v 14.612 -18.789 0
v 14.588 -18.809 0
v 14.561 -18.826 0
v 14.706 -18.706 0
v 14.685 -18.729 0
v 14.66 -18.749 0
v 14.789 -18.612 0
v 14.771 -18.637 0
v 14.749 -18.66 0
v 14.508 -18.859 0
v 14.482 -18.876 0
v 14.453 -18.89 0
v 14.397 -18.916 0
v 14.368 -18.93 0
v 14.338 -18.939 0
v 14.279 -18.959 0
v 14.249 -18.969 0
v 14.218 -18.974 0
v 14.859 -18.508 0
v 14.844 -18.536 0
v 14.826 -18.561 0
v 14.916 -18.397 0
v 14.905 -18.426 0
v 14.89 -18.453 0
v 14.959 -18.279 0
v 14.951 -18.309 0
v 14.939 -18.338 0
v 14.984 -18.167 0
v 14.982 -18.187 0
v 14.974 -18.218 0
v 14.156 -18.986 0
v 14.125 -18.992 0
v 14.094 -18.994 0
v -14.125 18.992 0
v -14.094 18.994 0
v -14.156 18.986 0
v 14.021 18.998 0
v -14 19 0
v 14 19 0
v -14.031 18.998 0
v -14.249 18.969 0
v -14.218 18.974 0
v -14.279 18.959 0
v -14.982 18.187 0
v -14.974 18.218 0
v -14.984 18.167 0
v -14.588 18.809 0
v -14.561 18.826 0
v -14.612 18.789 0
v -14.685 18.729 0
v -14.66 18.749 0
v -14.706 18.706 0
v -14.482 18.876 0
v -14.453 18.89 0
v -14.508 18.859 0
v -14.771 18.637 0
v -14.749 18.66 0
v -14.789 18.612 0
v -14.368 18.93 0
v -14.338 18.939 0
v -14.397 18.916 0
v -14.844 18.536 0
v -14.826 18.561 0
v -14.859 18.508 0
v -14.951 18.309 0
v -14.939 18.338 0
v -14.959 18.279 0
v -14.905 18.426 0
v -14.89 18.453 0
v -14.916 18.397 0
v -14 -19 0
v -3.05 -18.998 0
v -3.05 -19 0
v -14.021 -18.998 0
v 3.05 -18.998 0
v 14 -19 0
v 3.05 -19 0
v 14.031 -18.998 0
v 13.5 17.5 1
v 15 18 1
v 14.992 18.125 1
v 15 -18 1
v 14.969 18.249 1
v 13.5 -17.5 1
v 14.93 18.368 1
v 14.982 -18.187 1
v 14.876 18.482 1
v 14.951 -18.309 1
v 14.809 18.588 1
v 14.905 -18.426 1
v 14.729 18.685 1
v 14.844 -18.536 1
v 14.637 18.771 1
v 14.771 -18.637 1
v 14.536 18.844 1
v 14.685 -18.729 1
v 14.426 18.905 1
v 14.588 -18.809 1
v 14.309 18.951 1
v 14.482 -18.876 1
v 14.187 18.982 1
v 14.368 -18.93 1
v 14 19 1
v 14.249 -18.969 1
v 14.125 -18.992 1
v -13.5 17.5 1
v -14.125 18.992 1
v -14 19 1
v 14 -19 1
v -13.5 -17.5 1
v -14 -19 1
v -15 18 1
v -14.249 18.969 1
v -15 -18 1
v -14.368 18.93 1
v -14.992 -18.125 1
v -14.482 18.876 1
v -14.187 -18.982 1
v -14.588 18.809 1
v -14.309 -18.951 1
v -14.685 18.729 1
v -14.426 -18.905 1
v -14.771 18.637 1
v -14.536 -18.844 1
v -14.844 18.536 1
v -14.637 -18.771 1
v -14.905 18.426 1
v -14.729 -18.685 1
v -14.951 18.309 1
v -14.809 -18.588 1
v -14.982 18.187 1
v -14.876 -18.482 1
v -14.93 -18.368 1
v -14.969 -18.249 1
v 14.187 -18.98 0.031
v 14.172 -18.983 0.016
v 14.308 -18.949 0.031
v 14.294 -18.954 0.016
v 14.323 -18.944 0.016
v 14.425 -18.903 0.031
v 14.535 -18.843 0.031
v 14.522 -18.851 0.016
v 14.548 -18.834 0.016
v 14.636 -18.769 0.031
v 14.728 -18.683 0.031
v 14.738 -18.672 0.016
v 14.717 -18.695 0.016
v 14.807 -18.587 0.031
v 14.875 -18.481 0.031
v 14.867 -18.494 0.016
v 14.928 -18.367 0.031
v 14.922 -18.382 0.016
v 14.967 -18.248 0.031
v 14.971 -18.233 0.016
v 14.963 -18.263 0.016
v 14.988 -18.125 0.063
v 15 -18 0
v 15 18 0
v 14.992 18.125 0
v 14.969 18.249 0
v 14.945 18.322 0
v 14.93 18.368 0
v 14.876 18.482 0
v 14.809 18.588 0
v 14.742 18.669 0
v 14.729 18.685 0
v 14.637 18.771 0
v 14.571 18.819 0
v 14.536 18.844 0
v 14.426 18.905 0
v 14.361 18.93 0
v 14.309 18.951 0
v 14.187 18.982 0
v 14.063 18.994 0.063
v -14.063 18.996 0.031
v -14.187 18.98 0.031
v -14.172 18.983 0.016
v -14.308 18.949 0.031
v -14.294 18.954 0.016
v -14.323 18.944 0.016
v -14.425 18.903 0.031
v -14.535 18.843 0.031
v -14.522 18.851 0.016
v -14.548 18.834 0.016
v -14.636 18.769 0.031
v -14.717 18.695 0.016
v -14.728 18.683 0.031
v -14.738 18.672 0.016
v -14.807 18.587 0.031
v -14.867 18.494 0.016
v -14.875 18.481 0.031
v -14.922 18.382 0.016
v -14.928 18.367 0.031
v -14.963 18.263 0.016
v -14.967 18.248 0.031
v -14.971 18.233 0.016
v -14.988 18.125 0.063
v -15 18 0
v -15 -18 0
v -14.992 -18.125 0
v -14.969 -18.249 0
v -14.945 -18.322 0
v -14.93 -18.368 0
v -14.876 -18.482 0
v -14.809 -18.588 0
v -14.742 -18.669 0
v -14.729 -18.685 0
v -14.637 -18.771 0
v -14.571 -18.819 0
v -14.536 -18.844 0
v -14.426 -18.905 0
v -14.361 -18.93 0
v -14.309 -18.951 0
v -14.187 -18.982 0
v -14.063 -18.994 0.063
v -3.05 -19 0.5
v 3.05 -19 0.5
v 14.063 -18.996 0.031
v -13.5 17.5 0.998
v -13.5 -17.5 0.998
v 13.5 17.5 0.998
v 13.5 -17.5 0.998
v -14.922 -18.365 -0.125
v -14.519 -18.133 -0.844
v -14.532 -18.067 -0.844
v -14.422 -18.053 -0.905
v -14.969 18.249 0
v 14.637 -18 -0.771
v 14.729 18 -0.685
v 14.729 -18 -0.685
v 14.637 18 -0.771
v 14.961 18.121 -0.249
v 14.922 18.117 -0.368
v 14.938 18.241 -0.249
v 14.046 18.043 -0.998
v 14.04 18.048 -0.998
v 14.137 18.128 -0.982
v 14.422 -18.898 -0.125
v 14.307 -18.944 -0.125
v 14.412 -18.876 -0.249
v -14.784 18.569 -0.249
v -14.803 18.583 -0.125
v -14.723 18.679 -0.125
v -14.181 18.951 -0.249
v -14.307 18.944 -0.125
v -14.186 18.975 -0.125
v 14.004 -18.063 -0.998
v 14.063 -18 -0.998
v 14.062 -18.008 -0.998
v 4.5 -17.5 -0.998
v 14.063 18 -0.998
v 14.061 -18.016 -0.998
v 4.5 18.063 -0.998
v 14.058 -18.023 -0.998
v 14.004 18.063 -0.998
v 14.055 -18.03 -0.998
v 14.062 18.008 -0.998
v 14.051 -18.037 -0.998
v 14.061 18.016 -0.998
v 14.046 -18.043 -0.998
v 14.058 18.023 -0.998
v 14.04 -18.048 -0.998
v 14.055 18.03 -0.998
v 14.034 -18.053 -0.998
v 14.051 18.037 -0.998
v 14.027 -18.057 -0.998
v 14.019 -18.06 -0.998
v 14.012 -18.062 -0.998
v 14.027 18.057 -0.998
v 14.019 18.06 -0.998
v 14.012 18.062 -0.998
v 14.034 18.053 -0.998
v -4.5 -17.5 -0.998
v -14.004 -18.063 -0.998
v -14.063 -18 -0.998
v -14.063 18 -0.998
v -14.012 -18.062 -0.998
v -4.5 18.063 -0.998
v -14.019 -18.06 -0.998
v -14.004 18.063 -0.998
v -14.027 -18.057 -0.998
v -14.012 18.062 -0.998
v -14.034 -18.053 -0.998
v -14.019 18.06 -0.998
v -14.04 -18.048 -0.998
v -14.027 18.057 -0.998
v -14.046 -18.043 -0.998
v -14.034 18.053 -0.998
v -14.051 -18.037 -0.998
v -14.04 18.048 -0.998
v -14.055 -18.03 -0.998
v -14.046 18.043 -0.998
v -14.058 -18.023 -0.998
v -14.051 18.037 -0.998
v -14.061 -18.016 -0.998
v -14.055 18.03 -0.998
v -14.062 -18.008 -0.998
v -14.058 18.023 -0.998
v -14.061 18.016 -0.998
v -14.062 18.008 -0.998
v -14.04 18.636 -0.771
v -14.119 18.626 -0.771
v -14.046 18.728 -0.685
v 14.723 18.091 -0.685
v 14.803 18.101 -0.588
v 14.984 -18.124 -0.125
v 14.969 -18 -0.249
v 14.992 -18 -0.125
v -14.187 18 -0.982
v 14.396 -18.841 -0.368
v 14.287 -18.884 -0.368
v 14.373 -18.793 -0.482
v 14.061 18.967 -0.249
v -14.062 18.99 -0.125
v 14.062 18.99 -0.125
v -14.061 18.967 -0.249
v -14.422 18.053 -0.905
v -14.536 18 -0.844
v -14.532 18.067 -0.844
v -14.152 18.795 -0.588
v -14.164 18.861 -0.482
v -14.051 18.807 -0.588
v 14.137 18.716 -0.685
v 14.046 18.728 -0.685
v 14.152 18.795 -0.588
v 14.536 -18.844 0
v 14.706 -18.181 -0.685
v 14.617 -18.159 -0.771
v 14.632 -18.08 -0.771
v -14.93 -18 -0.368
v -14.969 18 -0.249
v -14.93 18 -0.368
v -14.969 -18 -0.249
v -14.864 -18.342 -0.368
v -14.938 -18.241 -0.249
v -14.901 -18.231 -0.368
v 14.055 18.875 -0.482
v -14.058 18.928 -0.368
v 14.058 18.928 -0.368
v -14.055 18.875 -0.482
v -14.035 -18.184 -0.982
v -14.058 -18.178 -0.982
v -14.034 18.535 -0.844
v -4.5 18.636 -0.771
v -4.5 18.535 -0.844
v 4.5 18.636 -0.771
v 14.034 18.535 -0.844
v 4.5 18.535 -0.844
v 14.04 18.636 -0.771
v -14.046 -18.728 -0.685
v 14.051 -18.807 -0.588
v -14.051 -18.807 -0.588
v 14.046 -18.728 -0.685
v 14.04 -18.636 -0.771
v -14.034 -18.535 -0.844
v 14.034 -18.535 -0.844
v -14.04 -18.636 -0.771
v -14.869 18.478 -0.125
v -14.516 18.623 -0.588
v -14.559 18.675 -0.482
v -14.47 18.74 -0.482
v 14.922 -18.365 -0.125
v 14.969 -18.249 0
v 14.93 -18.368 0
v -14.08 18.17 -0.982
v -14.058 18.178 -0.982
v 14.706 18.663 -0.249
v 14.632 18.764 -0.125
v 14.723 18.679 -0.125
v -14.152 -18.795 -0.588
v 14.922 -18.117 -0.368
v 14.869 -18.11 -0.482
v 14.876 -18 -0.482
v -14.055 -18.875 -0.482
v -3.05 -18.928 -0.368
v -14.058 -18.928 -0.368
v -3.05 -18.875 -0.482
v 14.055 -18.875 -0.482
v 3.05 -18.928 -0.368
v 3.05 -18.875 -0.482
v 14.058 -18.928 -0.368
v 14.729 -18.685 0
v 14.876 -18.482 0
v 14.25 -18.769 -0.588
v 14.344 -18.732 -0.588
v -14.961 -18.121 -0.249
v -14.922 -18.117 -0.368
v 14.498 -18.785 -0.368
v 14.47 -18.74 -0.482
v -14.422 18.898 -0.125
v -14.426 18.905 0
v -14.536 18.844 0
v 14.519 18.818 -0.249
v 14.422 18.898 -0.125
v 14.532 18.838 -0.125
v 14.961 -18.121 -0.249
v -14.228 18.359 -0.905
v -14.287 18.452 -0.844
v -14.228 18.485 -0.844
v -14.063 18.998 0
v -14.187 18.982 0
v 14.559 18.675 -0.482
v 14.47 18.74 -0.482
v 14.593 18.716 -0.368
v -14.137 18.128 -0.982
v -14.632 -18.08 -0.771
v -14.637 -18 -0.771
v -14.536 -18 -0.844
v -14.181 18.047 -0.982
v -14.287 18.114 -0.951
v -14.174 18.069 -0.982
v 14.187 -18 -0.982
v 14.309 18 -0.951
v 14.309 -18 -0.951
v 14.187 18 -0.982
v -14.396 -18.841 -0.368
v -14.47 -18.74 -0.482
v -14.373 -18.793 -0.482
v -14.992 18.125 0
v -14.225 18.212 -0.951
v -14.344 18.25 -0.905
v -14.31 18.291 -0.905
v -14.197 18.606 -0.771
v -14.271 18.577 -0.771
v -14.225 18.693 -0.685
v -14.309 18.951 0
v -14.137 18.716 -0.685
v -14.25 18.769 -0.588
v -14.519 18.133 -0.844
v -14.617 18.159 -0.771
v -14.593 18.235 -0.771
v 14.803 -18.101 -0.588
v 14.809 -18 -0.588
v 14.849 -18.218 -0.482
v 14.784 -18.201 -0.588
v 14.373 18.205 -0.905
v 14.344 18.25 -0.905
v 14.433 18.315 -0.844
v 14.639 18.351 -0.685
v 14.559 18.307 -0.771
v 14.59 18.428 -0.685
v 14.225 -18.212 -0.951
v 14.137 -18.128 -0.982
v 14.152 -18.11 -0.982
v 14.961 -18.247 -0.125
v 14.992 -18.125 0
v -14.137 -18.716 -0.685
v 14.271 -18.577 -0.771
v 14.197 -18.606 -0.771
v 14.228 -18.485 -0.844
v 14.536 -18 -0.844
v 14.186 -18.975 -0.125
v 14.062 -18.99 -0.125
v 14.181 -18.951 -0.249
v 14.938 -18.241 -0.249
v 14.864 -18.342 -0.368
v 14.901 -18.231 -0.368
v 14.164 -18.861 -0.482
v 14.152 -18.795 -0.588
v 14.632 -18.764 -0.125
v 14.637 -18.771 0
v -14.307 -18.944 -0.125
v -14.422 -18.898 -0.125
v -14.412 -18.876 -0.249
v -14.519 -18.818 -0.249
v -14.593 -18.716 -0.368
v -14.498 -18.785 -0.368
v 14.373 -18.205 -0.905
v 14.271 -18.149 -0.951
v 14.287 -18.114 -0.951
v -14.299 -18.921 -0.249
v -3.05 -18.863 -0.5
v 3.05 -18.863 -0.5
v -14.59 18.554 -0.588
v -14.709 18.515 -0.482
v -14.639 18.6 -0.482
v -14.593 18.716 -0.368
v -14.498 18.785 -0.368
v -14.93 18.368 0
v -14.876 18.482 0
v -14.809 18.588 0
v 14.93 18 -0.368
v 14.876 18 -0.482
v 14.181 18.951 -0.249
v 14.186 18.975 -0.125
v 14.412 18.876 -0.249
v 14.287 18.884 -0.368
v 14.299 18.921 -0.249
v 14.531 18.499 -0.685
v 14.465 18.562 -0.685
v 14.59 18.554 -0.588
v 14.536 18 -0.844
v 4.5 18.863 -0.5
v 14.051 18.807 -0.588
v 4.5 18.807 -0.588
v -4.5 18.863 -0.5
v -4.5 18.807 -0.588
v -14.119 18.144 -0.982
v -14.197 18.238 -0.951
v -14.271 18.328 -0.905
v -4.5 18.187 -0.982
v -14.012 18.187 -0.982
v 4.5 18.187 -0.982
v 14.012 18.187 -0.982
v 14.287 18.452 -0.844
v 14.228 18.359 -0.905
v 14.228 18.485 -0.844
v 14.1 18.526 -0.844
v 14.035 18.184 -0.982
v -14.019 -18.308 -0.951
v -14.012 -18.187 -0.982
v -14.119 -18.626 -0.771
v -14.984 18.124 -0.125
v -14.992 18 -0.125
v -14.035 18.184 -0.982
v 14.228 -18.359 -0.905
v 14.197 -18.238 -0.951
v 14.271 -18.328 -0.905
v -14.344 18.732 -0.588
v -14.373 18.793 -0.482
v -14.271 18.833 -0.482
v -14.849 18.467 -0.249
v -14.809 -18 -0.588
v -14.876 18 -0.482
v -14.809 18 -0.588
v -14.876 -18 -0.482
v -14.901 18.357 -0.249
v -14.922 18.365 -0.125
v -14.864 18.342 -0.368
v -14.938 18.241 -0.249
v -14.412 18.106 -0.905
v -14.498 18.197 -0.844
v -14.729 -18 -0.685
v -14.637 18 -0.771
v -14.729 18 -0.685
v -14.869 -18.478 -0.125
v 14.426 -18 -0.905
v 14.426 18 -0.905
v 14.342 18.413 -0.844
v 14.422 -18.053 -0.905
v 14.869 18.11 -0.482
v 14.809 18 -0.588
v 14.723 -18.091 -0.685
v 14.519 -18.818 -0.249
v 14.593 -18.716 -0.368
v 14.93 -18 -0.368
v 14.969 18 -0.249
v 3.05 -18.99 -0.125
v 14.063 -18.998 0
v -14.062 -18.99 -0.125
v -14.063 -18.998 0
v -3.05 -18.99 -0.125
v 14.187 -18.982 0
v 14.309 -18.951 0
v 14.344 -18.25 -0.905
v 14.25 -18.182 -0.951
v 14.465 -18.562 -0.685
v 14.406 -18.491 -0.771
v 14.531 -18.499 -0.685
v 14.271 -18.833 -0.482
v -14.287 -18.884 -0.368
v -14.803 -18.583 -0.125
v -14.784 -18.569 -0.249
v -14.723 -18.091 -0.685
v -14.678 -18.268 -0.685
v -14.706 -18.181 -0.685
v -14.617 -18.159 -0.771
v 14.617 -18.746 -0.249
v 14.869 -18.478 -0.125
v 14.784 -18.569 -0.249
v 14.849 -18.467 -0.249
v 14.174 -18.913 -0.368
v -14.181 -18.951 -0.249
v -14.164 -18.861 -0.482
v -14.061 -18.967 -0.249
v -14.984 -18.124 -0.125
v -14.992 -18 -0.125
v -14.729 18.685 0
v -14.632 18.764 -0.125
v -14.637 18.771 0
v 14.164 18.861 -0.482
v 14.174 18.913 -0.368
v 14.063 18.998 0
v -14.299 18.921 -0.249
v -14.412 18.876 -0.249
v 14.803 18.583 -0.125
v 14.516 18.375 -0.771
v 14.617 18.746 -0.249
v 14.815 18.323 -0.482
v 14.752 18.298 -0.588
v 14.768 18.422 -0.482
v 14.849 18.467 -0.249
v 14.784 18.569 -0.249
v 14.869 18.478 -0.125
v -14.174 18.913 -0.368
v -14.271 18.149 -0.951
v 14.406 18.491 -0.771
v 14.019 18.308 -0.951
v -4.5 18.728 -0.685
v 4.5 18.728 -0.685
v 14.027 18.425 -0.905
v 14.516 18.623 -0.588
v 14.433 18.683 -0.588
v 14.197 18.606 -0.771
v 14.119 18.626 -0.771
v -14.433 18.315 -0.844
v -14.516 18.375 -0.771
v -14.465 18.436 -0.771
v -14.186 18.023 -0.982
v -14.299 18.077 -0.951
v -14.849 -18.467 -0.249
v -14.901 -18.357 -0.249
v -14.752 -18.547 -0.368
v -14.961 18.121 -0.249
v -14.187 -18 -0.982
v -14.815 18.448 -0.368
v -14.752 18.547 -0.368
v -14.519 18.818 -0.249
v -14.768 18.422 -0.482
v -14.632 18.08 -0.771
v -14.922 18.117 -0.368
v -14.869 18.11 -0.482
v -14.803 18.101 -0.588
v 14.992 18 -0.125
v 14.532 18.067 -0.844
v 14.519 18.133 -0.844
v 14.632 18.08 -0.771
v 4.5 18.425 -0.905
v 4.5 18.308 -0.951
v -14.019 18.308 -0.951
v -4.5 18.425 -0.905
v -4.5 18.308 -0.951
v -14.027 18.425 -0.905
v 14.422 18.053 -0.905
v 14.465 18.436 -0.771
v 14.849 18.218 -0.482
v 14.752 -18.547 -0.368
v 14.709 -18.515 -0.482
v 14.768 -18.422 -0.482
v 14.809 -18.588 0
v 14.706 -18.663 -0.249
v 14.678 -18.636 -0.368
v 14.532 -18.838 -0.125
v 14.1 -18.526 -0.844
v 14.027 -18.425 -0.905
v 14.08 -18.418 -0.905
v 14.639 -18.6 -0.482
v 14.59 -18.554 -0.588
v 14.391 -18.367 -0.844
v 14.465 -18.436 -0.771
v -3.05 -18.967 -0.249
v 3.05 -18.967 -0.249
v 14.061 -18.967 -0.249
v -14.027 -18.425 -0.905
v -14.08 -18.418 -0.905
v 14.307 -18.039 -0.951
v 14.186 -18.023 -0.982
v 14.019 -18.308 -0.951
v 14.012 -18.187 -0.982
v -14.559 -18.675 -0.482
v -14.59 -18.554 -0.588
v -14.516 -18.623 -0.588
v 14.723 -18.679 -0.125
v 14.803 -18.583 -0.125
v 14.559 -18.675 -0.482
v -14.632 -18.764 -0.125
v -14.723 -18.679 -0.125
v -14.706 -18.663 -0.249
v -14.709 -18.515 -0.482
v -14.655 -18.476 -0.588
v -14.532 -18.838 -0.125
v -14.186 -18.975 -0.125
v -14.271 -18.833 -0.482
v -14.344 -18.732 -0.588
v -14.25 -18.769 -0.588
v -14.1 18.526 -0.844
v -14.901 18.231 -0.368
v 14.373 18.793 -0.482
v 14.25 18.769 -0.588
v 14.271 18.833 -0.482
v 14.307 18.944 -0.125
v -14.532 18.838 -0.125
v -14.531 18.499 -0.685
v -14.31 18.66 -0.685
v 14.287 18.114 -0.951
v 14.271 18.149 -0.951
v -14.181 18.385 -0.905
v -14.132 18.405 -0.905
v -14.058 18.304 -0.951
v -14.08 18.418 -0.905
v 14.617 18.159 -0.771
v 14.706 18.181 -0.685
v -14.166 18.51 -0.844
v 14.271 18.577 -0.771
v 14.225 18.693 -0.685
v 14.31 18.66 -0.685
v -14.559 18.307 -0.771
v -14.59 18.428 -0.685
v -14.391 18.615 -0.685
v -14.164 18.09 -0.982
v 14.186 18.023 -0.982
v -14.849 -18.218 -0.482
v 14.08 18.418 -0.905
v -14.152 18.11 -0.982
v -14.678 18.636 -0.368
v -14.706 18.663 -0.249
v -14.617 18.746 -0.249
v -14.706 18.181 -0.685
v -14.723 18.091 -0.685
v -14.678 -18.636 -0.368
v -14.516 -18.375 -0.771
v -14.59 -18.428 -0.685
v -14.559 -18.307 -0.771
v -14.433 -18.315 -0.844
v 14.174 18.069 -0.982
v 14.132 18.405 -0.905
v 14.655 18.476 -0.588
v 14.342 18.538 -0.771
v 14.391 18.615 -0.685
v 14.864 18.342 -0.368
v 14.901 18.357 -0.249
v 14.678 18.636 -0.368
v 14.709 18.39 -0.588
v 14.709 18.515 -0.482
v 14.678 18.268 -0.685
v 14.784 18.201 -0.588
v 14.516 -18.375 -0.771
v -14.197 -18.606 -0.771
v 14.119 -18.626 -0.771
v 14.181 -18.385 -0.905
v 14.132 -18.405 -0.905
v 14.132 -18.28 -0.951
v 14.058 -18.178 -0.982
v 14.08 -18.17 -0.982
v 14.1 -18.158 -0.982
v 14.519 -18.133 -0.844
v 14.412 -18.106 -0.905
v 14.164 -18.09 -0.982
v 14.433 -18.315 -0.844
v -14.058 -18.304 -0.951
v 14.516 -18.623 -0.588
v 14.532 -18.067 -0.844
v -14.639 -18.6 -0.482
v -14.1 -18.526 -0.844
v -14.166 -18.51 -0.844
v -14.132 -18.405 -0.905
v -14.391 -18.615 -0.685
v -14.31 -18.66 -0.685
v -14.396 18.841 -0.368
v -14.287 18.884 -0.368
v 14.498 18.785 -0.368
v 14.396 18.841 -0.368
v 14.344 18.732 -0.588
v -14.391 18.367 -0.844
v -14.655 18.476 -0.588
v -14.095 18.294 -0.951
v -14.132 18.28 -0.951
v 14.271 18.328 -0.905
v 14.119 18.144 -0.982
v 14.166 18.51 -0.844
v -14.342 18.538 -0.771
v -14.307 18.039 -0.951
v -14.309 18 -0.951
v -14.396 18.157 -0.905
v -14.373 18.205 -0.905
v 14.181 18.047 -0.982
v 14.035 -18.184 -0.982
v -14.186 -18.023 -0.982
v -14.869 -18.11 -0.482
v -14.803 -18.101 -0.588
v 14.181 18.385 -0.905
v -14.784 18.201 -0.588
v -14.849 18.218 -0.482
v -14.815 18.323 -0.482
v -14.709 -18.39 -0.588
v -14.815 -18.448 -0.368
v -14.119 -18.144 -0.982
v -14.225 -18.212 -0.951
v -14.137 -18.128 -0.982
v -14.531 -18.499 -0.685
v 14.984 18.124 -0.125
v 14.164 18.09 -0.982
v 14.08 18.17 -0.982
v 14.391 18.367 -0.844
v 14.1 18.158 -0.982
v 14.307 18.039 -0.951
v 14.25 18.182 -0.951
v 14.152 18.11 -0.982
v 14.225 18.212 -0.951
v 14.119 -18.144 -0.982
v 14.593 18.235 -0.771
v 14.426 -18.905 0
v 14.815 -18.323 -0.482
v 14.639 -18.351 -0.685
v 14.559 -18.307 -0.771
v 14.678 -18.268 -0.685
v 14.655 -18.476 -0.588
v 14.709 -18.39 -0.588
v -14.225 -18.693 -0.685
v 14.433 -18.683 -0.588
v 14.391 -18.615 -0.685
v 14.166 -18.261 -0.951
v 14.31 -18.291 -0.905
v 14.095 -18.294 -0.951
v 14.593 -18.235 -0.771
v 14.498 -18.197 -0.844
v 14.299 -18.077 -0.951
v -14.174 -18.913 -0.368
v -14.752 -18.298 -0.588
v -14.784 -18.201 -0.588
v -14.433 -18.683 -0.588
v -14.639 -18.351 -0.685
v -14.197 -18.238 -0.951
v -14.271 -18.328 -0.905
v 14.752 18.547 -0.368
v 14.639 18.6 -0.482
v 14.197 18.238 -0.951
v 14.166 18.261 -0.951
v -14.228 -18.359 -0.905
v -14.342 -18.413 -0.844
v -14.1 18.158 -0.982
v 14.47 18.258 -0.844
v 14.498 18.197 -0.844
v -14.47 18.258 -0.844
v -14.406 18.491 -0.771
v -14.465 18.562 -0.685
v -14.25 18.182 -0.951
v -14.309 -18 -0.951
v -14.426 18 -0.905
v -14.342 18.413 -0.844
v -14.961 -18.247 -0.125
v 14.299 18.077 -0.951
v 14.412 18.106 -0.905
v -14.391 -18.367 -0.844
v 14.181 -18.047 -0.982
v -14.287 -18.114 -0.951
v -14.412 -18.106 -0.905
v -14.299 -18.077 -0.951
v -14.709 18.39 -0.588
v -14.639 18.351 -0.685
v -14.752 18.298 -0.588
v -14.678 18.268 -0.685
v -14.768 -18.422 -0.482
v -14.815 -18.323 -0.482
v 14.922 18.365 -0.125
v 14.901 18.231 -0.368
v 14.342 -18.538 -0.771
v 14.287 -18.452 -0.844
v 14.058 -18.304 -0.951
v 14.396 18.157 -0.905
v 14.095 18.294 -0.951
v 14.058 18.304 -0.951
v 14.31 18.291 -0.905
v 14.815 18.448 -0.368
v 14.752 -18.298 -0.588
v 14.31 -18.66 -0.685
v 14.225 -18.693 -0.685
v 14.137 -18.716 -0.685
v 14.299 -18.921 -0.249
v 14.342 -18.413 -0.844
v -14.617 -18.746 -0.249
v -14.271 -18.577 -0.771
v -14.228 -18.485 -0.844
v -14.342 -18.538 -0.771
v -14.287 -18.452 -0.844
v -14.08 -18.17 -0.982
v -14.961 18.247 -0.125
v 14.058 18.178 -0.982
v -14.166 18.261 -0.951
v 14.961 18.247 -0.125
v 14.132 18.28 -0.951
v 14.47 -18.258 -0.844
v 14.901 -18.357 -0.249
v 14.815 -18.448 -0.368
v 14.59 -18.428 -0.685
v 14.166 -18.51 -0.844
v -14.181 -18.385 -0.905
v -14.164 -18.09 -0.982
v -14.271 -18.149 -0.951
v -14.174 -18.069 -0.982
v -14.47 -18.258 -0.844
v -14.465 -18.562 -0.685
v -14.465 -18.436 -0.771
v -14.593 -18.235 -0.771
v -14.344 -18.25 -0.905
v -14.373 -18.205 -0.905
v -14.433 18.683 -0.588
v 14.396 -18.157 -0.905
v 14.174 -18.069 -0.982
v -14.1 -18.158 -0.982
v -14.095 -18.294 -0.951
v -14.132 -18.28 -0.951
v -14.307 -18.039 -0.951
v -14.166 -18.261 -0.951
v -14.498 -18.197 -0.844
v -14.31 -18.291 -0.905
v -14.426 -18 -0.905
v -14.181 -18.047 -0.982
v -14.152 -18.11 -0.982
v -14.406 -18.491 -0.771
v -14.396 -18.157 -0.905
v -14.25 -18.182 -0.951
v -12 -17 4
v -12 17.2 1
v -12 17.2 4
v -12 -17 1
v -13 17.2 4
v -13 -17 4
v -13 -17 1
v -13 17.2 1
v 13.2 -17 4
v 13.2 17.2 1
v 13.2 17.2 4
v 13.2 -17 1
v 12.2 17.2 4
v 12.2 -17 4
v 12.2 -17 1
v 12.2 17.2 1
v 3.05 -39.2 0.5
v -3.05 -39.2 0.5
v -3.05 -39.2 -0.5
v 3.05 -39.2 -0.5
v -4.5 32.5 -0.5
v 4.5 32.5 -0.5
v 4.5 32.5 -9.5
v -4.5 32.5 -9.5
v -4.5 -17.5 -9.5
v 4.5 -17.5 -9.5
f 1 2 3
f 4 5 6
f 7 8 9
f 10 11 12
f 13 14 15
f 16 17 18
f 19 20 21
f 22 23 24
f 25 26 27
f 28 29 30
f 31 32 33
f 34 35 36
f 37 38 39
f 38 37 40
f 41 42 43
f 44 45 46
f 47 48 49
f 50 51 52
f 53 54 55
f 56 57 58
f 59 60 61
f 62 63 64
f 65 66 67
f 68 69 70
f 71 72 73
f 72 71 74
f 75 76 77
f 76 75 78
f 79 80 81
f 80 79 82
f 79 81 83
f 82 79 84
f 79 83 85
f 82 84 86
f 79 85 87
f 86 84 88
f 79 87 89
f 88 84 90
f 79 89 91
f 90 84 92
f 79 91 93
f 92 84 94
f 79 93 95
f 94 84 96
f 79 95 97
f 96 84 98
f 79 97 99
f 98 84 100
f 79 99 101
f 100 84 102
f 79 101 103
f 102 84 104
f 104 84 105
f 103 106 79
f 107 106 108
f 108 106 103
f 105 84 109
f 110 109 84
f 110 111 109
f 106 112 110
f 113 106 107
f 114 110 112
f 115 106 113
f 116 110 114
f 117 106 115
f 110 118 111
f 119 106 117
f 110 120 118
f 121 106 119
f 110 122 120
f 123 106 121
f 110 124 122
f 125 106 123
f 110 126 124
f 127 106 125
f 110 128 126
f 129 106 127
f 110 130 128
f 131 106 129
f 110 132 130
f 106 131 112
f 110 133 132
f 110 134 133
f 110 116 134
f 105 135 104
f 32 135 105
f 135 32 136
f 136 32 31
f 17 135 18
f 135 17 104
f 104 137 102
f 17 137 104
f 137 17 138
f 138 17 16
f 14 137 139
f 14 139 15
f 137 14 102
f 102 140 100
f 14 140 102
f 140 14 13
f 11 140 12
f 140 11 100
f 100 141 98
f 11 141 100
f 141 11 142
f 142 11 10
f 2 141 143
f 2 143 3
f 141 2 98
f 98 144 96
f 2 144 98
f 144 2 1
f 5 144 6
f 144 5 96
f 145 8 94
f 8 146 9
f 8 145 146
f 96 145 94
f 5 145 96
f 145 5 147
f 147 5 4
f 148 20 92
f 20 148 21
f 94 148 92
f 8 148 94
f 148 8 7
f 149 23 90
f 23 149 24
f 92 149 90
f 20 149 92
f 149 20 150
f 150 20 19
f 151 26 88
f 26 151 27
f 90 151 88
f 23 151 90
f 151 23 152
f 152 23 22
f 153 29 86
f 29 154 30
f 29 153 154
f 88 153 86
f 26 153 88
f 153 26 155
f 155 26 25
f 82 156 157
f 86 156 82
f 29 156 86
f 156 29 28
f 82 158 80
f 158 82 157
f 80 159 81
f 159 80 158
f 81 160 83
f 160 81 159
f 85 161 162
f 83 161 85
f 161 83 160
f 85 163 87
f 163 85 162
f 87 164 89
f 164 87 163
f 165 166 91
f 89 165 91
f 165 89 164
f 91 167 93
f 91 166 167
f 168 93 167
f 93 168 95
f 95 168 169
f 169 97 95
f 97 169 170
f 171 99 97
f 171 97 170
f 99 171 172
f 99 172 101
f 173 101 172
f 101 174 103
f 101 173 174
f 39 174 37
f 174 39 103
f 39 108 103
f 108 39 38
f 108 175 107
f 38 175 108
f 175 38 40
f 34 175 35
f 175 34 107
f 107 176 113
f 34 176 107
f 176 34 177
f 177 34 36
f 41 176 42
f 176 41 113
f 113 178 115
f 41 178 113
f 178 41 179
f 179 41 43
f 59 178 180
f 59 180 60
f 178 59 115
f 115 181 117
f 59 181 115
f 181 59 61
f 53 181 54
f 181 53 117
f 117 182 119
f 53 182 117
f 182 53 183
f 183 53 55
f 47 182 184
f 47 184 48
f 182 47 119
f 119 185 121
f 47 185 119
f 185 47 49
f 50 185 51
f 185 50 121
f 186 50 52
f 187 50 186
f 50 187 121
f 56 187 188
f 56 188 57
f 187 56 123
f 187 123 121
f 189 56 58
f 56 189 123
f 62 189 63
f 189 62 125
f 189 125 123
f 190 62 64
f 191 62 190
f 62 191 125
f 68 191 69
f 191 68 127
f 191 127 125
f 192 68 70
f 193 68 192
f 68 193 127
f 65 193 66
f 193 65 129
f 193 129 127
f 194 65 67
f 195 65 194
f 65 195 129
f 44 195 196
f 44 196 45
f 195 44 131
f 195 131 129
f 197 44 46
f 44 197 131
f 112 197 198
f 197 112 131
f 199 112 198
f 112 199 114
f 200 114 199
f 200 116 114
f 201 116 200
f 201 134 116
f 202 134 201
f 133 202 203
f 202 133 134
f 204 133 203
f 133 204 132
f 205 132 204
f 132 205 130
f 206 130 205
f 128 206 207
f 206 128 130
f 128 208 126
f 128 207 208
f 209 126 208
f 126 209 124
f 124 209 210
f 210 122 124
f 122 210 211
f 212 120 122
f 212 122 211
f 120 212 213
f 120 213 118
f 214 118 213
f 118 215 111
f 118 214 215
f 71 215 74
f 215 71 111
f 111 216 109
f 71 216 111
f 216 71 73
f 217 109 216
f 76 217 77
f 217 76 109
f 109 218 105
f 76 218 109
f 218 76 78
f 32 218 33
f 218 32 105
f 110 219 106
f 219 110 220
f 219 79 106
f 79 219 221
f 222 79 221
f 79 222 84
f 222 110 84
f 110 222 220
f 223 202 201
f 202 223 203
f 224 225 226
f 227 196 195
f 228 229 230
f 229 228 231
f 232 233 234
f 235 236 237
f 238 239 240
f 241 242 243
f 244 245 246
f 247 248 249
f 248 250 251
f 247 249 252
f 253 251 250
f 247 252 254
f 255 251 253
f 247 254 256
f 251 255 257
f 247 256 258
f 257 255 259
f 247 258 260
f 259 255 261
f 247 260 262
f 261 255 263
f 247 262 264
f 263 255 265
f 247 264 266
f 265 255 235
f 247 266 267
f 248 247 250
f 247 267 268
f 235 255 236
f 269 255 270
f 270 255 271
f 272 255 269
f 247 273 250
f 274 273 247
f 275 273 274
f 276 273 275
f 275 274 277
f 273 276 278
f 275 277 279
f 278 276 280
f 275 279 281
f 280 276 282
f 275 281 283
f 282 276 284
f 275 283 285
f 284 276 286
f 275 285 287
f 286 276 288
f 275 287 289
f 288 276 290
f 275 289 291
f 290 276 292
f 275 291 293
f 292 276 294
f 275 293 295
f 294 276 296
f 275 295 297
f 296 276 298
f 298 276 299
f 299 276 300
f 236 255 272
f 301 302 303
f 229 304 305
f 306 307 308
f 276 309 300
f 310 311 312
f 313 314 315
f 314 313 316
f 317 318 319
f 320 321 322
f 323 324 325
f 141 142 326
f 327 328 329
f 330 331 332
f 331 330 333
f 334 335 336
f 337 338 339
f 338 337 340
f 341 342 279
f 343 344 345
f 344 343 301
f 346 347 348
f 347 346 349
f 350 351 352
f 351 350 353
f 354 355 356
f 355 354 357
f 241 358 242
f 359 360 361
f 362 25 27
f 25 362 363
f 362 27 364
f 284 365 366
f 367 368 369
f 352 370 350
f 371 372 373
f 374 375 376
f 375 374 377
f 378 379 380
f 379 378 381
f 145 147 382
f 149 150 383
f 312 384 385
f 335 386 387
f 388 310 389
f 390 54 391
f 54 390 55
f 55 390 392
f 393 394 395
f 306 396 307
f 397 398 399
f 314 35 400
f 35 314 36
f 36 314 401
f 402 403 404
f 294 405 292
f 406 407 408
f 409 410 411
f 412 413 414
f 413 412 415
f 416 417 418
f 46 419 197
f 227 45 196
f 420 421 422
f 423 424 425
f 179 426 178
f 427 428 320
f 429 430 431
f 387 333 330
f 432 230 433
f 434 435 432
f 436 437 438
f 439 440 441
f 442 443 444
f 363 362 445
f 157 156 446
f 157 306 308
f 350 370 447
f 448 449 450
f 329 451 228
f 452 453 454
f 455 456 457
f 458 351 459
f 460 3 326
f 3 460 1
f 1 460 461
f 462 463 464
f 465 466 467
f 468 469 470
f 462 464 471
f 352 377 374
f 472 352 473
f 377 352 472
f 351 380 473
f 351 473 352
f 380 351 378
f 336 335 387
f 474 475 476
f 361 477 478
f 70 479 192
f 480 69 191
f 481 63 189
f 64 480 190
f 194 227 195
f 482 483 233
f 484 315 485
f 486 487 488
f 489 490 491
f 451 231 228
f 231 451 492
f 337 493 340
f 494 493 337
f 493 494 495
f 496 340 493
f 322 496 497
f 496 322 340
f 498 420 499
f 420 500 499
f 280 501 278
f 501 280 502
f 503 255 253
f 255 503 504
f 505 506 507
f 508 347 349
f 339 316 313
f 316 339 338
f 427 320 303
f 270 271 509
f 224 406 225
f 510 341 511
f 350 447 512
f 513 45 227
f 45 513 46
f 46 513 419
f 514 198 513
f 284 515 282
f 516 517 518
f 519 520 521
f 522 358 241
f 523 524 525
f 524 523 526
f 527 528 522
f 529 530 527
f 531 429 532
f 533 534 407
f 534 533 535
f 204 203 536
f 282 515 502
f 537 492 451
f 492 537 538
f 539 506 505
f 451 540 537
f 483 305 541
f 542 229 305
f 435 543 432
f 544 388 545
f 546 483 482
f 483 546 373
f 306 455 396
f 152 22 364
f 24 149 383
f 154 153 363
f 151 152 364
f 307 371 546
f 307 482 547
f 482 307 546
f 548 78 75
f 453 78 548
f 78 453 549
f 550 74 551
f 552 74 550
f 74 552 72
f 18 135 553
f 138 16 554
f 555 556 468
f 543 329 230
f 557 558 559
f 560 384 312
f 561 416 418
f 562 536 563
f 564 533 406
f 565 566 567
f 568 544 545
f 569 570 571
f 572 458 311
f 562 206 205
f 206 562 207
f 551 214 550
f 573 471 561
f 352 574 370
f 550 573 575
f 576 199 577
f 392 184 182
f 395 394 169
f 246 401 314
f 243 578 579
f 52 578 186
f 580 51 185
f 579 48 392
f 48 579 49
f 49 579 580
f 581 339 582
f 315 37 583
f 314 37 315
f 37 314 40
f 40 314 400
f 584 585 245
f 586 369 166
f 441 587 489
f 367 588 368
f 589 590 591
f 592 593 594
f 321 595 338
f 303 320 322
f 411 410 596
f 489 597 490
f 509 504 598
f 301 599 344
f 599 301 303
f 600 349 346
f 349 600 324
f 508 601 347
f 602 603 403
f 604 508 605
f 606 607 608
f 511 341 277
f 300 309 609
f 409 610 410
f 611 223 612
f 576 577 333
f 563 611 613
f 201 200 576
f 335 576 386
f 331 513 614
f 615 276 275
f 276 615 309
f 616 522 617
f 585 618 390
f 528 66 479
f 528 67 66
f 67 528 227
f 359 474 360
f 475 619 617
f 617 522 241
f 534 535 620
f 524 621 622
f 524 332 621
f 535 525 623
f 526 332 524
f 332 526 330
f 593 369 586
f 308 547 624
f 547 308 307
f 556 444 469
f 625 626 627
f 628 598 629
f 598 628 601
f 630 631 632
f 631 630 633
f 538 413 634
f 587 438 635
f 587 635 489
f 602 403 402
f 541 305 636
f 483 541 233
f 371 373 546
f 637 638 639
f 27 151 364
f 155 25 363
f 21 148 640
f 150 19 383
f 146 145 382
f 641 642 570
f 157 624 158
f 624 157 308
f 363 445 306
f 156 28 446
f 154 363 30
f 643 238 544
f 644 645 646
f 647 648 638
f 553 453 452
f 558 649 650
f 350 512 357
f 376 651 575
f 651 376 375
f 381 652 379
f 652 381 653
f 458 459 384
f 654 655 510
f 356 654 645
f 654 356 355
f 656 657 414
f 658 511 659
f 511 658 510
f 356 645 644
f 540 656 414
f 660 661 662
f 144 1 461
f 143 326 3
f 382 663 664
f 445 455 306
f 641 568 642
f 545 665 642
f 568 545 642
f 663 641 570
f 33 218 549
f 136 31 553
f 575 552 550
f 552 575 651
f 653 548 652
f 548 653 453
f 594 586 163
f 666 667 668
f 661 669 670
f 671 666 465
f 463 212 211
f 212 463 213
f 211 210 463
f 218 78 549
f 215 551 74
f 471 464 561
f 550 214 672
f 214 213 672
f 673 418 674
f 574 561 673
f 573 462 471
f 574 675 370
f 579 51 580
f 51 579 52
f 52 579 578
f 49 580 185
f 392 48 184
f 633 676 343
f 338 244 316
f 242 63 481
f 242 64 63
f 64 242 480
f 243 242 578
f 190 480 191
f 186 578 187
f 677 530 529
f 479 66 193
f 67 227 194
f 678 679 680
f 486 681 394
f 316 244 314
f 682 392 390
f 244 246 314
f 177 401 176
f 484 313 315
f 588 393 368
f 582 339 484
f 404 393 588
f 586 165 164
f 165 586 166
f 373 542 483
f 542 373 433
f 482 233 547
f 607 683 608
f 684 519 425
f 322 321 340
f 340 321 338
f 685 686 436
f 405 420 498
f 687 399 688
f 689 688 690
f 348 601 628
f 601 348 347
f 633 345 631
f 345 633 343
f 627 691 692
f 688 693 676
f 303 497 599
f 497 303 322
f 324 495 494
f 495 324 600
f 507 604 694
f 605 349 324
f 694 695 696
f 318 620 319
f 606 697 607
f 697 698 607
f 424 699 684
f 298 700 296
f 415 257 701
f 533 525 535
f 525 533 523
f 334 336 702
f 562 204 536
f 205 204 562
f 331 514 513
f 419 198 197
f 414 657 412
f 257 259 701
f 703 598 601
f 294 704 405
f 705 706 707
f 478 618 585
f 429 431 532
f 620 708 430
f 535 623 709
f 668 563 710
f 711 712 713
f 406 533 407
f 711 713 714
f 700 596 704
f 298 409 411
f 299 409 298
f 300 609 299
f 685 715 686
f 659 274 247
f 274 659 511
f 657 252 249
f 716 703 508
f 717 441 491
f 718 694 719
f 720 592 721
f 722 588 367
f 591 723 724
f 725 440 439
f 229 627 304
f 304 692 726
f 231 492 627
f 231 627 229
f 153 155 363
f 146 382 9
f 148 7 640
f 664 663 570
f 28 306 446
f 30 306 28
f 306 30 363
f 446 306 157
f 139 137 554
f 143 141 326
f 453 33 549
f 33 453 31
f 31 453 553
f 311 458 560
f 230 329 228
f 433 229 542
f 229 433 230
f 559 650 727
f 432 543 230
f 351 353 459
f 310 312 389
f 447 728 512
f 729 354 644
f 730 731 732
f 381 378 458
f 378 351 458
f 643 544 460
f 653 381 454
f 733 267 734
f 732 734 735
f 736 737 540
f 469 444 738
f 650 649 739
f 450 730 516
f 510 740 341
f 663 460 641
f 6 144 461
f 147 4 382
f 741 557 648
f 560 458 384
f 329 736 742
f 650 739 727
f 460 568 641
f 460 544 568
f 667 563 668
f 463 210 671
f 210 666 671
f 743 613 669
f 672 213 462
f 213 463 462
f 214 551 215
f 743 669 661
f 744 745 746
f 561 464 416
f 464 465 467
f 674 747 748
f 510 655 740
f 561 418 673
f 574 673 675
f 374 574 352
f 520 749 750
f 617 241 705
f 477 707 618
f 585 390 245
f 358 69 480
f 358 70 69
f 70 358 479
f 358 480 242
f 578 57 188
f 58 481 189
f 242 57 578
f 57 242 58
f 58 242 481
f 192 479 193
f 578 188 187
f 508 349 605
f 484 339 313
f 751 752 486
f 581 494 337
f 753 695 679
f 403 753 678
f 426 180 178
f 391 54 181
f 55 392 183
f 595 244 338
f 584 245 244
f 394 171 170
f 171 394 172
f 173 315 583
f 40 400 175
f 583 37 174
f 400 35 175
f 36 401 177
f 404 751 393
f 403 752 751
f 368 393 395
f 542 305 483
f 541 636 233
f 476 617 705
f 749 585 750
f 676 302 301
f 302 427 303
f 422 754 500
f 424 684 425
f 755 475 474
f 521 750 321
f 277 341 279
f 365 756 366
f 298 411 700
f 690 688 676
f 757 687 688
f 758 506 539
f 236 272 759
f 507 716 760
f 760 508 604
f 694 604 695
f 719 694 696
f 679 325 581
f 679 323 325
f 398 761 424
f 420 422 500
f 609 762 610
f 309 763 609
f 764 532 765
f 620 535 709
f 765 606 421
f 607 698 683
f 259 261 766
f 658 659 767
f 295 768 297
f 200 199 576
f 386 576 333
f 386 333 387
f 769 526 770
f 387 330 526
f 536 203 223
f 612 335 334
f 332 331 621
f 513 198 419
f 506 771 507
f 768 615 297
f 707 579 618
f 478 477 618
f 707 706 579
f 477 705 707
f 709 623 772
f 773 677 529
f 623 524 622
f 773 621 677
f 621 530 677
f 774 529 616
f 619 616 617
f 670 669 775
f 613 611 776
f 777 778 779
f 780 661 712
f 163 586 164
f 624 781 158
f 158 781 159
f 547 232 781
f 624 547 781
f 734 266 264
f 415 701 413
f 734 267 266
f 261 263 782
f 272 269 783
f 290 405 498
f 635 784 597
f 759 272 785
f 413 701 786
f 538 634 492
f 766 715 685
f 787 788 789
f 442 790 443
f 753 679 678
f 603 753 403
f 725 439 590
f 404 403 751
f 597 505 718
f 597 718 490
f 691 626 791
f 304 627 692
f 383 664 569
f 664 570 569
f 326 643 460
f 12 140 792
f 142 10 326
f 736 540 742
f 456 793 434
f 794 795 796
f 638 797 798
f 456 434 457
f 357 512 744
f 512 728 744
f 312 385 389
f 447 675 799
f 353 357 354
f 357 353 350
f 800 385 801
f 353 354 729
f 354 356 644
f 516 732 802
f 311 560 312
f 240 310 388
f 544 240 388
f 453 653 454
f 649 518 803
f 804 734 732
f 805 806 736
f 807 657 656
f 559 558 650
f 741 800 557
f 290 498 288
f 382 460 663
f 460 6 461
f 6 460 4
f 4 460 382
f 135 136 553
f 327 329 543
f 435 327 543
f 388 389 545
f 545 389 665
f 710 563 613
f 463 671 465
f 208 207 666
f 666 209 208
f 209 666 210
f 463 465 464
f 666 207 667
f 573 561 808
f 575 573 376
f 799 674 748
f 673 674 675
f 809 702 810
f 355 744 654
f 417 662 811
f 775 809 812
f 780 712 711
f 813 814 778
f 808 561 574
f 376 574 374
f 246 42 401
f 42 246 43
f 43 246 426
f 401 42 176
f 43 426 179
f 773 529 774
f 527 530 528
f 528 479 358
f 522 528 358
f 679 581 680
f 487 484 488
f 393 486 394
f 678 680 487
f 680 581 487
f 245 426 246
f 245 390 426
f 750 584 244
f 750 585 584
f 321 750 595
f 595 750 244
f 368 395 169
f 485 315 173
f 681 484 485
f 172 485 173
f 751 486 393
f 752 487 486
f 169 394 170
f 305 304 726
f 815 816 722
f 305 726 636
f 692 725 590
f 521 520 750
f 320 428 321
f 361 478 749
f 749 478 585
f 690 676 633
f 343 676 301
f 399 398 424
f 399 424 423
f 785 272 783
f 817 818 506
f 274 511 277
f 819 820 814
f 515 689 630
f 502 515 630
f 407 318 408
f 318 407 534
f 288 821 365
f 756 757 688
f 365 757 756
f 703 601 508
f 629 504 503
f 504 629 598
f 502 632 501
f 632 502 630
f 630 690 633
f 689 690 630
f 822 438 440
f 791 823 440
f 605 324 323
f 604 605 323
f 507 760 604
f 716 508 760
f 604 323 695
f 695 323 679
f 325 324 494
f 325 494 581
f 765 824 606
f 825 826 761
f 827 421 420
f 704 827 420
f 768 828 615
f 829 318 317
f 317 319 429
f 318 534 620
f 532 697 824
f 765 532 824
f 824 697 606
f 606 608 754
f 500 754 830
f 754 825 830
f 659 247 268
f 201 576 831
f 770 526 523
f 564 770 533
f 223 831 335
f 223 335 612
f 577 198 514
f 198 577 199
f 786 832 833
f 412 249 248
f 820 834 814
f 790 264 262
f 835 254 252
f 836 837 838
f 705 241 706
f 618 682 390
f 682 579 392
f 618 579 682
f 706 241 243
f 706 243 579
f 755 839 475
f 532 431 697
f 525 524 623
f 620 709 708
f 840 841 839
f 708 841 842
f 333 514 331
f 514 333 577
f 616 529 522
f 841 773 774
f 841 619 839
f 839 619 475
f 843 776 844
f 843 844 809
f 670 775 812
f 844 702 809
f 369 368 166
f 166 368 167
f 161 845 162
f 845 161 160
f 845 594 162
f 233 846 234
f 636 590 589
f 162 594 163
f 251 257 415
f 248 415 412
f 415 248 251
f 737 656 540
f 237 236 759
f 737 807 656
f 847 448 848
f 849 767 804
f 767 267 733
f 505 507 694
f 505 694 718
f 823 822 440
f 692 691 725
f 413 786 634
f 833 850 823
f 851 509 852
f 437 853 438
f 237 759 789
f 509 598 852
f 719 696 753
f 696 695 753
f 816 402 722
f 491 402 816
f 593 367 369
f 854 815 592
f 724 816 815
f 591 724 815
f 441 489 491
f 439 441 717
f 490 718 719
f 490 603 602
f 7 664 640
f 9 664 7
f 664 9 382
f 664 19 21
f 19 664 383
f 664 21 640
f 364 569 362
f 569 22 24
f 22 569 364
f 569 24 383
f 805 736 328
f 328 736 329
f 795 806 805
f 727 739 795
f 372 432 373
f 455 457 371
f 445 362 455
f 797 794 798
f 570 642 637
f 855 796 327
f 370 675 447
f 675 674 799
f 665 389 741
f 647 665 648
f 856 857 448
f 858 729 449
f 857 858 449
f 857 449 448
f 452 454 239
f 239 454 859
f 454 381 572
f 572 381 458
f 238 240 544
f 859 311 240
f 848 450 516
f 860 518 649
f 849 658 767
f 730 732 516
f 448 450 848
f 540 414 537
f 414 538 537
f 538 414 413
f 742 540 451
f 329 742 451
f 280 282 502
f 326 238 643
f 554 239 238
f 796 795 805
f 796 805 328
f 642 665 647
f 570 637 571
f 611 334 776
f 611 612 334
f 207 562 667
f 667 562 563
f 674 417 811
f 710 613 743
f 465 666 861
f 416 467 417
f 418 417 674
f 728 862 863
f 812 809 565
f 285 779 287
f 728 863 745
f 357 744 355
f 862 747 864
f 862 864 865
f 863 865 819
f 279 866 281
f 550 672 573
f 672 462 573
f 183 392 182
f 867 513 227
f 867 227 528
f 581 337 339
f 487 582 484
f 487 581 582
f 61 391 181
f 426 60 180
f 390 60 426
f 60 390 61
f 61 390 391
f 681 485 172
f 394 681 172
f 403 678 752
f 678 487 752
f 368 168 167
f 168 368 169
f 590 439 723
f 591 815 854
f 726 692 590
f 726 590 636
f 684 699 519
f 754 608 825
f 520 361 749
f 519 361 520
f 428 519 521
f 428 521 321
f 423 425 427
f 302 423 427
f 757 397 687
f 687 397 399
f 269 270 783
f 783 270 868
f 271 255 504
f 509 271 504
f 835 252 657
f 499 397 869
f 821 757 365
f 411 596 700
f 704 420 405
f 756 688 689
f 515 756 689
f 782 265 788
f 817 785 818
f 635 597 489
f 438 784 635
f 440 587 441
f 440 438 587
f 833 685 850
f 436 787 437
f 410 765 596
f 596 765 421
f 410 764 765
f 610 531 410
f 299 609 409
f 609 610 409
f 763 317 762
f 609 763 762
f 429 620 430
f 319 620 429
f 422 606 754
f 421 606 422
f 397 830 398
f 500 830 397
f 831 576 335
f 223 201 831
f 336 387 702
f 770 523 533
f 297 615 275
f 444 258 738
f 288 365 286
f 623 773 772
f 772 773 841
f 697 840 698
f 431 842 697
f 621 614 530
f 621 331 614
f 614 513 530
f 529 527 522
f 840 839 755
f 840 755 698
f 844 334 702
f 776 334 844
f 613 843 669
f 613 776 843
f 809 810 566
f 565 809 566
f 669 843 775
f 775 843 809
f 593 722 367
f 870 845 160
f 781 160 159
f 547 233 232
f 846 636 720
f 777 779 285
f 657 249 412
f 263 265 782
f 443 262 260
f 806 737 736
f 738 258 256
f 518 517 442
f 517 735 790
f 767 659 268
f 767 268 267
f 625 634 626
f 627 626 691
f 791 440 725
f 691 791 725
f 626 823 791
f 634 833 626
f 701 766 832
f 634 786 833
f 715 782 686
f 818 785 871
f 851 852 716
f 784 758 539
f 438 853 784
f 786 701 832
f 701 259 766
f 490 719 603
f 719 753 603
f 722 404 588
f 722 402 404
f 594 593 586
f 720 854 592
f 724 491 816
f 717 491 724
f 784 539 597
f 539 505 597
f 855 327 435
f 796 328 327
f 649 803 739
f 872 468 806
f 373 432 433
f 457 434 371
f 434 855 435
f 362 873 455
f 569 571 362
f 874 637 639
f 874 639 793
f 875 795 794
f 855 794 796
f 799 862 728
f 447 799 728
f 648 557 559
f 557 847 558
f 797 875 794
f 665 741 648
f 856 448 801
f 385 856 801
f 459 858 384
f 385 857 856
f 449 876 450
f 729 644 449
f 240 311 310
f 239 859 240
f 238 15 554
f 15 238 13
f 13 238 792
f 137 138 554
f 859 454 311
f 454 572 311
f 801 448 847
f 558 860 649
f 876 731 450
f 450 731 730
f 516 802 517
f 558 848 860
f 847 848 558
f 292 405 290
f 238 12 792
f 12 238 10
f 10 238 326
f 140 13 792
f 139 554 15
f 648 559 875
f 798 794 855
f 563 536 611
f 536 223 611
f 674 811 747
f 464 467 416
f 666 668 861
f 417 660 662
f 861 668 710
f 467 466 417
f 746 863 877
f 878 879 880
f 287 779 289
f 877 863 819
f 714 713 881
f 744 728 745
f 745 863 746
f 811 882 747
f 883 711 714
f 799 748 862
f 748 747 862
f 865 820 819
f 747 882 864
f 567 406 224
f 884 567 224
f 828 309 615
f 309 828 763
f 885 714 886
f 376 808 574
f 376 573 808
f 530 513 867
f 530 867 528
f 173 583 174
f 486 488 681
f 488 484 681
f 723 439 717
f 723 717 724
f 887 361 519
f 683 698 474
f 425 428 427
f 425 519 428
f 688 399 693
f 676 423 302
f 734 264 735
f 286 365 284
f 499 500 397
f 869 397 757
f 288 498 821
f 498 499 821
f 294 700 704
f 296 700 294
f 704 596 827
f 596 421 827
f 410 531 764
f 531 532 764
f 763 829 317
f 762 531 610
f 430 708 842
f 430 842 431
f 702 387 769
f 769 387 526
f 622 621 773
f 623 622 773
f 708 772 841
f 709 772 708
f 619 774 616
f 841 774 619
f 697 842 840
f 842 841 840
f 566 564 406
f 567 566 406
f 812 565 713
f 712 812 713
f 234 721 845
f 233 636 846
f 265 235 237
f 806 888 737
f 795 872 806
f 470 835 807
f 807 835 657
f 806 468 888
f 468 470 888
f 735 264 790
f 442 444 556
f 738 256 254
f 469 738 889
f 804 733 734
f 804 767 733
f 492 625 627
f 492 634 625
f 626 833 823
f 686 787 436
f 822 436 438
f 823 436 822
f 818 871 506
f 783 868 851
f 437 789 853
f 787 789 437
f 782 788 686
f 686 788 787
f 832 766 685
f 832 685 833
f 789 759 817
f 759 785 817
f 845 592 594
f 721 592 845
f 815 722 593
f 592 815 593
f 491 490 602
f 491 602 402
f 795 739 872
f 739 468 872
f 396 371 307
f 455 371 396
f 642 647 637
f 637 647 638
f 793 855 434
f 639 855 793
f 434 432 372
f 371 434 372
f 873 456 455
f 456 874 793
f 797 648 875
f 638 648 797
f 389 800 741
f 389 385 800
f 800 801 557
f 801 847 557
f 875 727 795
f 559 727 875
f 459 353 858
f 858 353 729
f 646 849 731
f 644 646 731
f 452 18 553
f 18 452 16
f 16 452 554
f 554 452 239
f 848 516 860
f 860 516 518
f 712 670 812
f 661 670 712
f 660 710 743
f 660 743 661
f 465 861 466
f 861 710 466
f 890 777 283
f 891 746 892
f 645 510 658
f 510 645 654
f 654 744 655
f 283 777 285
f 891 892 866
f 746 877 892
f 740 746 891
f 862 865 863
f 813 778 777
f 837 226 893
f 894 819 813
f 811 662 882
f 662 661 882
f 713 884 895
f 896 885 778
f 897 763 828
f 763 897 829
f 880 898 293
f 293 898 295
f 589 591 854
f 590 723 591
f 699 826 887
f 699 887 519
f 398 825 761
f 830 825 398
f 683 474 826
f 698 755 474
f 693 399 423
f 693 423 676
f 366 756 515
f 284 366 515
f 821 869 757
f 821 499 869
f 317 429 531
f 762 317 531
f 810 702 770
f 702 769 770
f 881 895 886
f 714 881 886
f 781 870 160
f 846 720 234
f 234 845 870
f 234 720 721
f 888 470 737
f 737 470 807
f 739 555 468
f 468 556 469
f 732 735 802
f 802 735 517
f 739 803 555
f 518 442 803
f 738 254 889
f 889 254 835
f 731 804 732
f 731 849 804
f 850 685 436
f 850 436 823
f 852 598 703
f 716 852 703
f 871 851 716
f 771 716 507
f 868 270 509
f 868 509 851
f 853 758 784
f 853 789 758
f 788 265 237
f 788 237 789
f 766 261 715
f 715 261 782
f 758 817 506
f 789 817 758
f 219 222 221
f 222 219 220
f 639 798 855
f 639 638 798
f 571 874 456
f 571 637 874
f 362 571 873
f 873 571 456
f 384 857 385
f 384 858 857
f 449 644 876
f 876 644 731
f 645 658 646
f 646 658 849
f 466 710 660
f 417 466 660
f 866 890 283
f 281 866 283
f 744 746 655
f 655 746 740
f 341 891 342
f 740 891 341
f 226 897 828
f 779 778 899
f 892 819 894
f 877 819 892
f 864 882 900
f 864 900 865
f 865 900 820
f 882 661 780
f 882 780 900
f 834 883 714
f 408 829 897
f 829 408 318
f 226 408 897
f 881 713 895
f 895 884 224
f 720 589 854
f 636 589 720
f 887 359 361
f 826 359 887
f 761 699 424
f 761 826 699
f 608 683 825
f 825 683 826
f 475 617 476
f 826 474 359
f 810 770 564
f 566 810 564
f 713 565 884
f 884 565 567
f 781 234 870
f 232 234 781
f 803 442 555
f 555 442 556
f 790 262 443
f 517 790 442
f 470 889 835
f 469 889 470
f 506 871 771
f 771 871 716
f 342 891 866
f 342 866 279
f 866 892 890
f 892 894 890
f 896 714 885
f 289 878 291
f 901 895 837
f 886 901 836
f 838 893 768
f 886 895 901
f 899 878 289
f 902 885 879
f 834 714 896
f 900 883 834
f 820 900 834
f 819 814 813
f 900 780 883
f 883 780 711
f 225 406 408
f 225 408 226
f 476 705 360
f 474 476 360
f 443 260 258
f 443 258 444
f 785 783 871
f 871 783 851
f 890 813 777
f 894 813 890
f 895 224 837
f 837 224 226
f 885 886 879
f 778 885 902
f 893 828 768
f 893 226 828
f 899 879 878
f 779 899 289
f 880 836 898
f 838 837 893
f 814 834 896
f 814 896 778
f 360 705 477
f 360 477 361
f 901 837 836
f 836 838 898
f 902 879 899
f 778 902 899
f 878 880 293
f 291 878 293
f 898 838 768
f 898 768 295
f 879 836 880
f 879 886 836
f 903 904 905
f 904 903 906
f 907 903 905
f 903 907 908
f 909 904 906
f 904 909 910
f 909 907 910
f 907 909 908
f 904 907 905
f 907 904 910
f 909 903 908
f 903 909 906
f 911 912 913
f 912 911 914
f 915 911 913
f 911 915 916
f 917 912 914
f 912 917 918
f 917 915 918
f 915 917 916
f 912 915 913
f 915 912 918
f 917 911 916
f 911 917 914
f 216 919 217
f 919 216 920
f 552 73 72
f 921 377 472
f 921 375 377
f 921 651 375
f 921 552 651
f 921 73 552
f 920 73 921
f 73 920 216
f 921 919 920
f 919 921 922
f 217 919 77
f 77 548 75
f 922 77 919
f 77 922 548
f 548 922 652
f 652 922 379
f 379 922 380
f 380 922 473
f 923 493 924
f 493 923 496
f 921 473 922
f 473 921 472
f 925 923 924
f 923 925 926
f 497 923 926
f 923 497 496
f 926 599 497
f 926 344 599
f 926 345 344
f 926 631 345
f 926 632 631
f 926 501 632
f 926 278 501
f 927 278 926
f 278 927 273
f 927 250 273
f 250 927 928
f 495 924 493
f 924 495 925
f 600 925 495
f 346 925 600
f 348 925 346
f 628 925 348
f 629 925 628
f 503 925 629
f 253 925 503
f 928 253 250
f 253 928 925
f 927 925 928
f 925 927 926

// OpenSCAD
$fn=50;
BOX_W = 28; // Box Width
BOX_L = 36;// Box Length
BOX_H = 1.0; // Box Height
//SCREW_SIZE = .5; // Screw size in mm
CORNER_RADIUS = 1.0; // Radius of corners
WALL = 1.0;// Wall Thickness

KEEL_WIDTH=9.0;
KEEL_HEIGHT=9.0;
KEEL_LENGTH=50;


difference() {
  union() {
    linear_extrude( BOX_H )
    difference(){
      offset(r=CORNER_RADIUS) square( [BOX_W, BOX_L], center=true );
      offset( r= CORNER_RADIUS - WALL ) square( [BOX_W-WALL, BOX_L-WALL],  center=true );
    };

    coordinates = [ [0,0],[0,BOX_L],[BOX_W,BOX_L],[BOX_W,0] ];

    translate ( [-BOX_W/2, -BOX_L/2] )
    hull()
    for (i = coordinates)
      translate(i) sphere(CORNER_RADIUS);

    translate([BOX_W/-2+WALL,BOX_L/-2+1,WALL]) cube([WALL,BOX_L-(WALL*2)+0.2,3]);

    translate([BOX_W/2-WALL*1.8,BOX_L/-2+1,WALL]) cube([WALL,BOX_L-(WALL*2)+0.2,3]);

    // mic channel cover
    translate([0,-17,WALL-1])
    rotate([90,0,0])
    #linear_extrude(22.2) square([6.1,1.0], center=true);
    
    // keel
    translate([0,32.5,-5])
    rotate([90,0,0])
    #linear_extrude(KEEL_LENGTH) square([KEEL_WIDTH, KEEL_HEIGHT], center=true);  
    
  }

}
